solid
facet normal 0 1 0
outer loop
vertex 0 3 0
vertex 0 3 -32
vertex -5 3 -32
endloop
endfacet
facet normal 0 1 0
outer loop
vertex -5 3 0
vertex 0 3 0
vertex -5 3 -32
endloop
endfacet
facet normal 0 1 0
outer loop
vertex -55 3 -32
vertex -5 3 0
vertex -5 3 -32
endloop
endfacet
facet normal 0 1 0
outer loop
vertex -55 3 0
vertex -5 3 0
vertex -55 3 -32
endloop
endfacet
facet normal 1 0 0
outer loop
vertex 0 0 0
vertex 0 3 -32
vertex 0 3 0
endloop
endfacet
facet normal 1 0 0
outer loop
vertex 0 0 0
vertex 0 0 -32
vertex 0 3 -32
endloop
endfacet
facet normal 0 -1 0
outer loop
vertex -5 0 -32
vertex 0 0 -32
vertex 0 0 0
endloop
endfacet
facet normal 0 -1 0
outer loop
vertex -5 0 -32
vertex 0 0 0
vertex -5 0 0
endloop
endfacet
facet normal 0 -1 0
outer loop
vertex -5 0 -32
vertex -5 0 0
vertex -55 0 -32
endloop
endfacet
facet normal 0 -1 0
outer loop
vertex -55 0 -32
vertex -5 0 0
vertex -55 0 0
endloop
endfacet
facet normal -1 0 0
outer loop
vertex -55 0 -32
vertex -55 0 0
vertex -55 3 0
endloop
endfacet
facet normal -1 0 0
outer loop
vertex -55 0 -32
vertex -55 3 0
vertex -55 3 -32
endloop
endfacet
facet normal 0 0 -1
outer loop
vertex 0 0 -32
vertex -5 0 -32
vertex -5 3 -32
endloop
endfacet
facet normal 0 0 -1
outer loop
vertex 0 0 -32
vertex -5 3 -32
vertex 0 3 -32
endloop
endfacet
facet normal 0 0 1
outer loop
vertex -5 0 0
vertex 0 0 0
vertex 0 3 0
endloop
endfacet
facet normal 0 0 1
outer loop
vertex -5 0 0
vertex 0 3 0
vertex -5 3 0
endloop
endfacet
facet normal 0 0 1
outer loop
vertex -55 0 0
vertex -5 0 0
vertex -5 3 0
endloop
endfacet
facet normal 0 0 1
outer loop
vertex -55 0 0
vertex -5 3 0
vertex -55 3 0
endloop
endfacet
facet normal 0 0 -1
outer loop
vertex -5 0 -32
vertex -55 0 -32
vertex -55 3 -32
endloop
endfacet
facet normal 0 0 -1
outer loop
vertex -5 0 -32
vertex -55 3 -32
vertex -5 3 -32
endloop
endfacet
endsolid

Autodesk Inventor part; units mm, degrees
ref_plane "YZ Plane" through (0, 0, 0) normal (1, 0, 0) x (0, 1, 0)
ref_plane "XZ Plane" through (0, 0, 0) normal (0, 1, 0) x (-1, 0, 0)
ref_plane "XY Plane" through (0, 0, 0) normal (0, 0, 1) x (1, 0, 0)
sketch "Esquisse1" plane through (0, 0, 0) normal (0, 1, 0) x (-1, 0, 0)
  line L0 (0, 0) -> (55, 0)
  line L1 (55, 0) -> (55, -32)
  line L2 (55, -32) -> (0, -32)
  line L3 (0, -32) -> (0, 0)
  line L4 (55, -16) -> (0, -16) construction
  line L5 (0, -32) -> (5, -32)
  line L6 (55, 0) -> (0, 0)
  line L7 (0, 0) -> (0, -32)
  line L8 (0, 0) -> (5, 0)
  dimension "d0" = 32
  dimension "d6" = 55
extrude "Extrusion1" add sketch "Esquisse1" along normal blind 3
properties part number "cache"
